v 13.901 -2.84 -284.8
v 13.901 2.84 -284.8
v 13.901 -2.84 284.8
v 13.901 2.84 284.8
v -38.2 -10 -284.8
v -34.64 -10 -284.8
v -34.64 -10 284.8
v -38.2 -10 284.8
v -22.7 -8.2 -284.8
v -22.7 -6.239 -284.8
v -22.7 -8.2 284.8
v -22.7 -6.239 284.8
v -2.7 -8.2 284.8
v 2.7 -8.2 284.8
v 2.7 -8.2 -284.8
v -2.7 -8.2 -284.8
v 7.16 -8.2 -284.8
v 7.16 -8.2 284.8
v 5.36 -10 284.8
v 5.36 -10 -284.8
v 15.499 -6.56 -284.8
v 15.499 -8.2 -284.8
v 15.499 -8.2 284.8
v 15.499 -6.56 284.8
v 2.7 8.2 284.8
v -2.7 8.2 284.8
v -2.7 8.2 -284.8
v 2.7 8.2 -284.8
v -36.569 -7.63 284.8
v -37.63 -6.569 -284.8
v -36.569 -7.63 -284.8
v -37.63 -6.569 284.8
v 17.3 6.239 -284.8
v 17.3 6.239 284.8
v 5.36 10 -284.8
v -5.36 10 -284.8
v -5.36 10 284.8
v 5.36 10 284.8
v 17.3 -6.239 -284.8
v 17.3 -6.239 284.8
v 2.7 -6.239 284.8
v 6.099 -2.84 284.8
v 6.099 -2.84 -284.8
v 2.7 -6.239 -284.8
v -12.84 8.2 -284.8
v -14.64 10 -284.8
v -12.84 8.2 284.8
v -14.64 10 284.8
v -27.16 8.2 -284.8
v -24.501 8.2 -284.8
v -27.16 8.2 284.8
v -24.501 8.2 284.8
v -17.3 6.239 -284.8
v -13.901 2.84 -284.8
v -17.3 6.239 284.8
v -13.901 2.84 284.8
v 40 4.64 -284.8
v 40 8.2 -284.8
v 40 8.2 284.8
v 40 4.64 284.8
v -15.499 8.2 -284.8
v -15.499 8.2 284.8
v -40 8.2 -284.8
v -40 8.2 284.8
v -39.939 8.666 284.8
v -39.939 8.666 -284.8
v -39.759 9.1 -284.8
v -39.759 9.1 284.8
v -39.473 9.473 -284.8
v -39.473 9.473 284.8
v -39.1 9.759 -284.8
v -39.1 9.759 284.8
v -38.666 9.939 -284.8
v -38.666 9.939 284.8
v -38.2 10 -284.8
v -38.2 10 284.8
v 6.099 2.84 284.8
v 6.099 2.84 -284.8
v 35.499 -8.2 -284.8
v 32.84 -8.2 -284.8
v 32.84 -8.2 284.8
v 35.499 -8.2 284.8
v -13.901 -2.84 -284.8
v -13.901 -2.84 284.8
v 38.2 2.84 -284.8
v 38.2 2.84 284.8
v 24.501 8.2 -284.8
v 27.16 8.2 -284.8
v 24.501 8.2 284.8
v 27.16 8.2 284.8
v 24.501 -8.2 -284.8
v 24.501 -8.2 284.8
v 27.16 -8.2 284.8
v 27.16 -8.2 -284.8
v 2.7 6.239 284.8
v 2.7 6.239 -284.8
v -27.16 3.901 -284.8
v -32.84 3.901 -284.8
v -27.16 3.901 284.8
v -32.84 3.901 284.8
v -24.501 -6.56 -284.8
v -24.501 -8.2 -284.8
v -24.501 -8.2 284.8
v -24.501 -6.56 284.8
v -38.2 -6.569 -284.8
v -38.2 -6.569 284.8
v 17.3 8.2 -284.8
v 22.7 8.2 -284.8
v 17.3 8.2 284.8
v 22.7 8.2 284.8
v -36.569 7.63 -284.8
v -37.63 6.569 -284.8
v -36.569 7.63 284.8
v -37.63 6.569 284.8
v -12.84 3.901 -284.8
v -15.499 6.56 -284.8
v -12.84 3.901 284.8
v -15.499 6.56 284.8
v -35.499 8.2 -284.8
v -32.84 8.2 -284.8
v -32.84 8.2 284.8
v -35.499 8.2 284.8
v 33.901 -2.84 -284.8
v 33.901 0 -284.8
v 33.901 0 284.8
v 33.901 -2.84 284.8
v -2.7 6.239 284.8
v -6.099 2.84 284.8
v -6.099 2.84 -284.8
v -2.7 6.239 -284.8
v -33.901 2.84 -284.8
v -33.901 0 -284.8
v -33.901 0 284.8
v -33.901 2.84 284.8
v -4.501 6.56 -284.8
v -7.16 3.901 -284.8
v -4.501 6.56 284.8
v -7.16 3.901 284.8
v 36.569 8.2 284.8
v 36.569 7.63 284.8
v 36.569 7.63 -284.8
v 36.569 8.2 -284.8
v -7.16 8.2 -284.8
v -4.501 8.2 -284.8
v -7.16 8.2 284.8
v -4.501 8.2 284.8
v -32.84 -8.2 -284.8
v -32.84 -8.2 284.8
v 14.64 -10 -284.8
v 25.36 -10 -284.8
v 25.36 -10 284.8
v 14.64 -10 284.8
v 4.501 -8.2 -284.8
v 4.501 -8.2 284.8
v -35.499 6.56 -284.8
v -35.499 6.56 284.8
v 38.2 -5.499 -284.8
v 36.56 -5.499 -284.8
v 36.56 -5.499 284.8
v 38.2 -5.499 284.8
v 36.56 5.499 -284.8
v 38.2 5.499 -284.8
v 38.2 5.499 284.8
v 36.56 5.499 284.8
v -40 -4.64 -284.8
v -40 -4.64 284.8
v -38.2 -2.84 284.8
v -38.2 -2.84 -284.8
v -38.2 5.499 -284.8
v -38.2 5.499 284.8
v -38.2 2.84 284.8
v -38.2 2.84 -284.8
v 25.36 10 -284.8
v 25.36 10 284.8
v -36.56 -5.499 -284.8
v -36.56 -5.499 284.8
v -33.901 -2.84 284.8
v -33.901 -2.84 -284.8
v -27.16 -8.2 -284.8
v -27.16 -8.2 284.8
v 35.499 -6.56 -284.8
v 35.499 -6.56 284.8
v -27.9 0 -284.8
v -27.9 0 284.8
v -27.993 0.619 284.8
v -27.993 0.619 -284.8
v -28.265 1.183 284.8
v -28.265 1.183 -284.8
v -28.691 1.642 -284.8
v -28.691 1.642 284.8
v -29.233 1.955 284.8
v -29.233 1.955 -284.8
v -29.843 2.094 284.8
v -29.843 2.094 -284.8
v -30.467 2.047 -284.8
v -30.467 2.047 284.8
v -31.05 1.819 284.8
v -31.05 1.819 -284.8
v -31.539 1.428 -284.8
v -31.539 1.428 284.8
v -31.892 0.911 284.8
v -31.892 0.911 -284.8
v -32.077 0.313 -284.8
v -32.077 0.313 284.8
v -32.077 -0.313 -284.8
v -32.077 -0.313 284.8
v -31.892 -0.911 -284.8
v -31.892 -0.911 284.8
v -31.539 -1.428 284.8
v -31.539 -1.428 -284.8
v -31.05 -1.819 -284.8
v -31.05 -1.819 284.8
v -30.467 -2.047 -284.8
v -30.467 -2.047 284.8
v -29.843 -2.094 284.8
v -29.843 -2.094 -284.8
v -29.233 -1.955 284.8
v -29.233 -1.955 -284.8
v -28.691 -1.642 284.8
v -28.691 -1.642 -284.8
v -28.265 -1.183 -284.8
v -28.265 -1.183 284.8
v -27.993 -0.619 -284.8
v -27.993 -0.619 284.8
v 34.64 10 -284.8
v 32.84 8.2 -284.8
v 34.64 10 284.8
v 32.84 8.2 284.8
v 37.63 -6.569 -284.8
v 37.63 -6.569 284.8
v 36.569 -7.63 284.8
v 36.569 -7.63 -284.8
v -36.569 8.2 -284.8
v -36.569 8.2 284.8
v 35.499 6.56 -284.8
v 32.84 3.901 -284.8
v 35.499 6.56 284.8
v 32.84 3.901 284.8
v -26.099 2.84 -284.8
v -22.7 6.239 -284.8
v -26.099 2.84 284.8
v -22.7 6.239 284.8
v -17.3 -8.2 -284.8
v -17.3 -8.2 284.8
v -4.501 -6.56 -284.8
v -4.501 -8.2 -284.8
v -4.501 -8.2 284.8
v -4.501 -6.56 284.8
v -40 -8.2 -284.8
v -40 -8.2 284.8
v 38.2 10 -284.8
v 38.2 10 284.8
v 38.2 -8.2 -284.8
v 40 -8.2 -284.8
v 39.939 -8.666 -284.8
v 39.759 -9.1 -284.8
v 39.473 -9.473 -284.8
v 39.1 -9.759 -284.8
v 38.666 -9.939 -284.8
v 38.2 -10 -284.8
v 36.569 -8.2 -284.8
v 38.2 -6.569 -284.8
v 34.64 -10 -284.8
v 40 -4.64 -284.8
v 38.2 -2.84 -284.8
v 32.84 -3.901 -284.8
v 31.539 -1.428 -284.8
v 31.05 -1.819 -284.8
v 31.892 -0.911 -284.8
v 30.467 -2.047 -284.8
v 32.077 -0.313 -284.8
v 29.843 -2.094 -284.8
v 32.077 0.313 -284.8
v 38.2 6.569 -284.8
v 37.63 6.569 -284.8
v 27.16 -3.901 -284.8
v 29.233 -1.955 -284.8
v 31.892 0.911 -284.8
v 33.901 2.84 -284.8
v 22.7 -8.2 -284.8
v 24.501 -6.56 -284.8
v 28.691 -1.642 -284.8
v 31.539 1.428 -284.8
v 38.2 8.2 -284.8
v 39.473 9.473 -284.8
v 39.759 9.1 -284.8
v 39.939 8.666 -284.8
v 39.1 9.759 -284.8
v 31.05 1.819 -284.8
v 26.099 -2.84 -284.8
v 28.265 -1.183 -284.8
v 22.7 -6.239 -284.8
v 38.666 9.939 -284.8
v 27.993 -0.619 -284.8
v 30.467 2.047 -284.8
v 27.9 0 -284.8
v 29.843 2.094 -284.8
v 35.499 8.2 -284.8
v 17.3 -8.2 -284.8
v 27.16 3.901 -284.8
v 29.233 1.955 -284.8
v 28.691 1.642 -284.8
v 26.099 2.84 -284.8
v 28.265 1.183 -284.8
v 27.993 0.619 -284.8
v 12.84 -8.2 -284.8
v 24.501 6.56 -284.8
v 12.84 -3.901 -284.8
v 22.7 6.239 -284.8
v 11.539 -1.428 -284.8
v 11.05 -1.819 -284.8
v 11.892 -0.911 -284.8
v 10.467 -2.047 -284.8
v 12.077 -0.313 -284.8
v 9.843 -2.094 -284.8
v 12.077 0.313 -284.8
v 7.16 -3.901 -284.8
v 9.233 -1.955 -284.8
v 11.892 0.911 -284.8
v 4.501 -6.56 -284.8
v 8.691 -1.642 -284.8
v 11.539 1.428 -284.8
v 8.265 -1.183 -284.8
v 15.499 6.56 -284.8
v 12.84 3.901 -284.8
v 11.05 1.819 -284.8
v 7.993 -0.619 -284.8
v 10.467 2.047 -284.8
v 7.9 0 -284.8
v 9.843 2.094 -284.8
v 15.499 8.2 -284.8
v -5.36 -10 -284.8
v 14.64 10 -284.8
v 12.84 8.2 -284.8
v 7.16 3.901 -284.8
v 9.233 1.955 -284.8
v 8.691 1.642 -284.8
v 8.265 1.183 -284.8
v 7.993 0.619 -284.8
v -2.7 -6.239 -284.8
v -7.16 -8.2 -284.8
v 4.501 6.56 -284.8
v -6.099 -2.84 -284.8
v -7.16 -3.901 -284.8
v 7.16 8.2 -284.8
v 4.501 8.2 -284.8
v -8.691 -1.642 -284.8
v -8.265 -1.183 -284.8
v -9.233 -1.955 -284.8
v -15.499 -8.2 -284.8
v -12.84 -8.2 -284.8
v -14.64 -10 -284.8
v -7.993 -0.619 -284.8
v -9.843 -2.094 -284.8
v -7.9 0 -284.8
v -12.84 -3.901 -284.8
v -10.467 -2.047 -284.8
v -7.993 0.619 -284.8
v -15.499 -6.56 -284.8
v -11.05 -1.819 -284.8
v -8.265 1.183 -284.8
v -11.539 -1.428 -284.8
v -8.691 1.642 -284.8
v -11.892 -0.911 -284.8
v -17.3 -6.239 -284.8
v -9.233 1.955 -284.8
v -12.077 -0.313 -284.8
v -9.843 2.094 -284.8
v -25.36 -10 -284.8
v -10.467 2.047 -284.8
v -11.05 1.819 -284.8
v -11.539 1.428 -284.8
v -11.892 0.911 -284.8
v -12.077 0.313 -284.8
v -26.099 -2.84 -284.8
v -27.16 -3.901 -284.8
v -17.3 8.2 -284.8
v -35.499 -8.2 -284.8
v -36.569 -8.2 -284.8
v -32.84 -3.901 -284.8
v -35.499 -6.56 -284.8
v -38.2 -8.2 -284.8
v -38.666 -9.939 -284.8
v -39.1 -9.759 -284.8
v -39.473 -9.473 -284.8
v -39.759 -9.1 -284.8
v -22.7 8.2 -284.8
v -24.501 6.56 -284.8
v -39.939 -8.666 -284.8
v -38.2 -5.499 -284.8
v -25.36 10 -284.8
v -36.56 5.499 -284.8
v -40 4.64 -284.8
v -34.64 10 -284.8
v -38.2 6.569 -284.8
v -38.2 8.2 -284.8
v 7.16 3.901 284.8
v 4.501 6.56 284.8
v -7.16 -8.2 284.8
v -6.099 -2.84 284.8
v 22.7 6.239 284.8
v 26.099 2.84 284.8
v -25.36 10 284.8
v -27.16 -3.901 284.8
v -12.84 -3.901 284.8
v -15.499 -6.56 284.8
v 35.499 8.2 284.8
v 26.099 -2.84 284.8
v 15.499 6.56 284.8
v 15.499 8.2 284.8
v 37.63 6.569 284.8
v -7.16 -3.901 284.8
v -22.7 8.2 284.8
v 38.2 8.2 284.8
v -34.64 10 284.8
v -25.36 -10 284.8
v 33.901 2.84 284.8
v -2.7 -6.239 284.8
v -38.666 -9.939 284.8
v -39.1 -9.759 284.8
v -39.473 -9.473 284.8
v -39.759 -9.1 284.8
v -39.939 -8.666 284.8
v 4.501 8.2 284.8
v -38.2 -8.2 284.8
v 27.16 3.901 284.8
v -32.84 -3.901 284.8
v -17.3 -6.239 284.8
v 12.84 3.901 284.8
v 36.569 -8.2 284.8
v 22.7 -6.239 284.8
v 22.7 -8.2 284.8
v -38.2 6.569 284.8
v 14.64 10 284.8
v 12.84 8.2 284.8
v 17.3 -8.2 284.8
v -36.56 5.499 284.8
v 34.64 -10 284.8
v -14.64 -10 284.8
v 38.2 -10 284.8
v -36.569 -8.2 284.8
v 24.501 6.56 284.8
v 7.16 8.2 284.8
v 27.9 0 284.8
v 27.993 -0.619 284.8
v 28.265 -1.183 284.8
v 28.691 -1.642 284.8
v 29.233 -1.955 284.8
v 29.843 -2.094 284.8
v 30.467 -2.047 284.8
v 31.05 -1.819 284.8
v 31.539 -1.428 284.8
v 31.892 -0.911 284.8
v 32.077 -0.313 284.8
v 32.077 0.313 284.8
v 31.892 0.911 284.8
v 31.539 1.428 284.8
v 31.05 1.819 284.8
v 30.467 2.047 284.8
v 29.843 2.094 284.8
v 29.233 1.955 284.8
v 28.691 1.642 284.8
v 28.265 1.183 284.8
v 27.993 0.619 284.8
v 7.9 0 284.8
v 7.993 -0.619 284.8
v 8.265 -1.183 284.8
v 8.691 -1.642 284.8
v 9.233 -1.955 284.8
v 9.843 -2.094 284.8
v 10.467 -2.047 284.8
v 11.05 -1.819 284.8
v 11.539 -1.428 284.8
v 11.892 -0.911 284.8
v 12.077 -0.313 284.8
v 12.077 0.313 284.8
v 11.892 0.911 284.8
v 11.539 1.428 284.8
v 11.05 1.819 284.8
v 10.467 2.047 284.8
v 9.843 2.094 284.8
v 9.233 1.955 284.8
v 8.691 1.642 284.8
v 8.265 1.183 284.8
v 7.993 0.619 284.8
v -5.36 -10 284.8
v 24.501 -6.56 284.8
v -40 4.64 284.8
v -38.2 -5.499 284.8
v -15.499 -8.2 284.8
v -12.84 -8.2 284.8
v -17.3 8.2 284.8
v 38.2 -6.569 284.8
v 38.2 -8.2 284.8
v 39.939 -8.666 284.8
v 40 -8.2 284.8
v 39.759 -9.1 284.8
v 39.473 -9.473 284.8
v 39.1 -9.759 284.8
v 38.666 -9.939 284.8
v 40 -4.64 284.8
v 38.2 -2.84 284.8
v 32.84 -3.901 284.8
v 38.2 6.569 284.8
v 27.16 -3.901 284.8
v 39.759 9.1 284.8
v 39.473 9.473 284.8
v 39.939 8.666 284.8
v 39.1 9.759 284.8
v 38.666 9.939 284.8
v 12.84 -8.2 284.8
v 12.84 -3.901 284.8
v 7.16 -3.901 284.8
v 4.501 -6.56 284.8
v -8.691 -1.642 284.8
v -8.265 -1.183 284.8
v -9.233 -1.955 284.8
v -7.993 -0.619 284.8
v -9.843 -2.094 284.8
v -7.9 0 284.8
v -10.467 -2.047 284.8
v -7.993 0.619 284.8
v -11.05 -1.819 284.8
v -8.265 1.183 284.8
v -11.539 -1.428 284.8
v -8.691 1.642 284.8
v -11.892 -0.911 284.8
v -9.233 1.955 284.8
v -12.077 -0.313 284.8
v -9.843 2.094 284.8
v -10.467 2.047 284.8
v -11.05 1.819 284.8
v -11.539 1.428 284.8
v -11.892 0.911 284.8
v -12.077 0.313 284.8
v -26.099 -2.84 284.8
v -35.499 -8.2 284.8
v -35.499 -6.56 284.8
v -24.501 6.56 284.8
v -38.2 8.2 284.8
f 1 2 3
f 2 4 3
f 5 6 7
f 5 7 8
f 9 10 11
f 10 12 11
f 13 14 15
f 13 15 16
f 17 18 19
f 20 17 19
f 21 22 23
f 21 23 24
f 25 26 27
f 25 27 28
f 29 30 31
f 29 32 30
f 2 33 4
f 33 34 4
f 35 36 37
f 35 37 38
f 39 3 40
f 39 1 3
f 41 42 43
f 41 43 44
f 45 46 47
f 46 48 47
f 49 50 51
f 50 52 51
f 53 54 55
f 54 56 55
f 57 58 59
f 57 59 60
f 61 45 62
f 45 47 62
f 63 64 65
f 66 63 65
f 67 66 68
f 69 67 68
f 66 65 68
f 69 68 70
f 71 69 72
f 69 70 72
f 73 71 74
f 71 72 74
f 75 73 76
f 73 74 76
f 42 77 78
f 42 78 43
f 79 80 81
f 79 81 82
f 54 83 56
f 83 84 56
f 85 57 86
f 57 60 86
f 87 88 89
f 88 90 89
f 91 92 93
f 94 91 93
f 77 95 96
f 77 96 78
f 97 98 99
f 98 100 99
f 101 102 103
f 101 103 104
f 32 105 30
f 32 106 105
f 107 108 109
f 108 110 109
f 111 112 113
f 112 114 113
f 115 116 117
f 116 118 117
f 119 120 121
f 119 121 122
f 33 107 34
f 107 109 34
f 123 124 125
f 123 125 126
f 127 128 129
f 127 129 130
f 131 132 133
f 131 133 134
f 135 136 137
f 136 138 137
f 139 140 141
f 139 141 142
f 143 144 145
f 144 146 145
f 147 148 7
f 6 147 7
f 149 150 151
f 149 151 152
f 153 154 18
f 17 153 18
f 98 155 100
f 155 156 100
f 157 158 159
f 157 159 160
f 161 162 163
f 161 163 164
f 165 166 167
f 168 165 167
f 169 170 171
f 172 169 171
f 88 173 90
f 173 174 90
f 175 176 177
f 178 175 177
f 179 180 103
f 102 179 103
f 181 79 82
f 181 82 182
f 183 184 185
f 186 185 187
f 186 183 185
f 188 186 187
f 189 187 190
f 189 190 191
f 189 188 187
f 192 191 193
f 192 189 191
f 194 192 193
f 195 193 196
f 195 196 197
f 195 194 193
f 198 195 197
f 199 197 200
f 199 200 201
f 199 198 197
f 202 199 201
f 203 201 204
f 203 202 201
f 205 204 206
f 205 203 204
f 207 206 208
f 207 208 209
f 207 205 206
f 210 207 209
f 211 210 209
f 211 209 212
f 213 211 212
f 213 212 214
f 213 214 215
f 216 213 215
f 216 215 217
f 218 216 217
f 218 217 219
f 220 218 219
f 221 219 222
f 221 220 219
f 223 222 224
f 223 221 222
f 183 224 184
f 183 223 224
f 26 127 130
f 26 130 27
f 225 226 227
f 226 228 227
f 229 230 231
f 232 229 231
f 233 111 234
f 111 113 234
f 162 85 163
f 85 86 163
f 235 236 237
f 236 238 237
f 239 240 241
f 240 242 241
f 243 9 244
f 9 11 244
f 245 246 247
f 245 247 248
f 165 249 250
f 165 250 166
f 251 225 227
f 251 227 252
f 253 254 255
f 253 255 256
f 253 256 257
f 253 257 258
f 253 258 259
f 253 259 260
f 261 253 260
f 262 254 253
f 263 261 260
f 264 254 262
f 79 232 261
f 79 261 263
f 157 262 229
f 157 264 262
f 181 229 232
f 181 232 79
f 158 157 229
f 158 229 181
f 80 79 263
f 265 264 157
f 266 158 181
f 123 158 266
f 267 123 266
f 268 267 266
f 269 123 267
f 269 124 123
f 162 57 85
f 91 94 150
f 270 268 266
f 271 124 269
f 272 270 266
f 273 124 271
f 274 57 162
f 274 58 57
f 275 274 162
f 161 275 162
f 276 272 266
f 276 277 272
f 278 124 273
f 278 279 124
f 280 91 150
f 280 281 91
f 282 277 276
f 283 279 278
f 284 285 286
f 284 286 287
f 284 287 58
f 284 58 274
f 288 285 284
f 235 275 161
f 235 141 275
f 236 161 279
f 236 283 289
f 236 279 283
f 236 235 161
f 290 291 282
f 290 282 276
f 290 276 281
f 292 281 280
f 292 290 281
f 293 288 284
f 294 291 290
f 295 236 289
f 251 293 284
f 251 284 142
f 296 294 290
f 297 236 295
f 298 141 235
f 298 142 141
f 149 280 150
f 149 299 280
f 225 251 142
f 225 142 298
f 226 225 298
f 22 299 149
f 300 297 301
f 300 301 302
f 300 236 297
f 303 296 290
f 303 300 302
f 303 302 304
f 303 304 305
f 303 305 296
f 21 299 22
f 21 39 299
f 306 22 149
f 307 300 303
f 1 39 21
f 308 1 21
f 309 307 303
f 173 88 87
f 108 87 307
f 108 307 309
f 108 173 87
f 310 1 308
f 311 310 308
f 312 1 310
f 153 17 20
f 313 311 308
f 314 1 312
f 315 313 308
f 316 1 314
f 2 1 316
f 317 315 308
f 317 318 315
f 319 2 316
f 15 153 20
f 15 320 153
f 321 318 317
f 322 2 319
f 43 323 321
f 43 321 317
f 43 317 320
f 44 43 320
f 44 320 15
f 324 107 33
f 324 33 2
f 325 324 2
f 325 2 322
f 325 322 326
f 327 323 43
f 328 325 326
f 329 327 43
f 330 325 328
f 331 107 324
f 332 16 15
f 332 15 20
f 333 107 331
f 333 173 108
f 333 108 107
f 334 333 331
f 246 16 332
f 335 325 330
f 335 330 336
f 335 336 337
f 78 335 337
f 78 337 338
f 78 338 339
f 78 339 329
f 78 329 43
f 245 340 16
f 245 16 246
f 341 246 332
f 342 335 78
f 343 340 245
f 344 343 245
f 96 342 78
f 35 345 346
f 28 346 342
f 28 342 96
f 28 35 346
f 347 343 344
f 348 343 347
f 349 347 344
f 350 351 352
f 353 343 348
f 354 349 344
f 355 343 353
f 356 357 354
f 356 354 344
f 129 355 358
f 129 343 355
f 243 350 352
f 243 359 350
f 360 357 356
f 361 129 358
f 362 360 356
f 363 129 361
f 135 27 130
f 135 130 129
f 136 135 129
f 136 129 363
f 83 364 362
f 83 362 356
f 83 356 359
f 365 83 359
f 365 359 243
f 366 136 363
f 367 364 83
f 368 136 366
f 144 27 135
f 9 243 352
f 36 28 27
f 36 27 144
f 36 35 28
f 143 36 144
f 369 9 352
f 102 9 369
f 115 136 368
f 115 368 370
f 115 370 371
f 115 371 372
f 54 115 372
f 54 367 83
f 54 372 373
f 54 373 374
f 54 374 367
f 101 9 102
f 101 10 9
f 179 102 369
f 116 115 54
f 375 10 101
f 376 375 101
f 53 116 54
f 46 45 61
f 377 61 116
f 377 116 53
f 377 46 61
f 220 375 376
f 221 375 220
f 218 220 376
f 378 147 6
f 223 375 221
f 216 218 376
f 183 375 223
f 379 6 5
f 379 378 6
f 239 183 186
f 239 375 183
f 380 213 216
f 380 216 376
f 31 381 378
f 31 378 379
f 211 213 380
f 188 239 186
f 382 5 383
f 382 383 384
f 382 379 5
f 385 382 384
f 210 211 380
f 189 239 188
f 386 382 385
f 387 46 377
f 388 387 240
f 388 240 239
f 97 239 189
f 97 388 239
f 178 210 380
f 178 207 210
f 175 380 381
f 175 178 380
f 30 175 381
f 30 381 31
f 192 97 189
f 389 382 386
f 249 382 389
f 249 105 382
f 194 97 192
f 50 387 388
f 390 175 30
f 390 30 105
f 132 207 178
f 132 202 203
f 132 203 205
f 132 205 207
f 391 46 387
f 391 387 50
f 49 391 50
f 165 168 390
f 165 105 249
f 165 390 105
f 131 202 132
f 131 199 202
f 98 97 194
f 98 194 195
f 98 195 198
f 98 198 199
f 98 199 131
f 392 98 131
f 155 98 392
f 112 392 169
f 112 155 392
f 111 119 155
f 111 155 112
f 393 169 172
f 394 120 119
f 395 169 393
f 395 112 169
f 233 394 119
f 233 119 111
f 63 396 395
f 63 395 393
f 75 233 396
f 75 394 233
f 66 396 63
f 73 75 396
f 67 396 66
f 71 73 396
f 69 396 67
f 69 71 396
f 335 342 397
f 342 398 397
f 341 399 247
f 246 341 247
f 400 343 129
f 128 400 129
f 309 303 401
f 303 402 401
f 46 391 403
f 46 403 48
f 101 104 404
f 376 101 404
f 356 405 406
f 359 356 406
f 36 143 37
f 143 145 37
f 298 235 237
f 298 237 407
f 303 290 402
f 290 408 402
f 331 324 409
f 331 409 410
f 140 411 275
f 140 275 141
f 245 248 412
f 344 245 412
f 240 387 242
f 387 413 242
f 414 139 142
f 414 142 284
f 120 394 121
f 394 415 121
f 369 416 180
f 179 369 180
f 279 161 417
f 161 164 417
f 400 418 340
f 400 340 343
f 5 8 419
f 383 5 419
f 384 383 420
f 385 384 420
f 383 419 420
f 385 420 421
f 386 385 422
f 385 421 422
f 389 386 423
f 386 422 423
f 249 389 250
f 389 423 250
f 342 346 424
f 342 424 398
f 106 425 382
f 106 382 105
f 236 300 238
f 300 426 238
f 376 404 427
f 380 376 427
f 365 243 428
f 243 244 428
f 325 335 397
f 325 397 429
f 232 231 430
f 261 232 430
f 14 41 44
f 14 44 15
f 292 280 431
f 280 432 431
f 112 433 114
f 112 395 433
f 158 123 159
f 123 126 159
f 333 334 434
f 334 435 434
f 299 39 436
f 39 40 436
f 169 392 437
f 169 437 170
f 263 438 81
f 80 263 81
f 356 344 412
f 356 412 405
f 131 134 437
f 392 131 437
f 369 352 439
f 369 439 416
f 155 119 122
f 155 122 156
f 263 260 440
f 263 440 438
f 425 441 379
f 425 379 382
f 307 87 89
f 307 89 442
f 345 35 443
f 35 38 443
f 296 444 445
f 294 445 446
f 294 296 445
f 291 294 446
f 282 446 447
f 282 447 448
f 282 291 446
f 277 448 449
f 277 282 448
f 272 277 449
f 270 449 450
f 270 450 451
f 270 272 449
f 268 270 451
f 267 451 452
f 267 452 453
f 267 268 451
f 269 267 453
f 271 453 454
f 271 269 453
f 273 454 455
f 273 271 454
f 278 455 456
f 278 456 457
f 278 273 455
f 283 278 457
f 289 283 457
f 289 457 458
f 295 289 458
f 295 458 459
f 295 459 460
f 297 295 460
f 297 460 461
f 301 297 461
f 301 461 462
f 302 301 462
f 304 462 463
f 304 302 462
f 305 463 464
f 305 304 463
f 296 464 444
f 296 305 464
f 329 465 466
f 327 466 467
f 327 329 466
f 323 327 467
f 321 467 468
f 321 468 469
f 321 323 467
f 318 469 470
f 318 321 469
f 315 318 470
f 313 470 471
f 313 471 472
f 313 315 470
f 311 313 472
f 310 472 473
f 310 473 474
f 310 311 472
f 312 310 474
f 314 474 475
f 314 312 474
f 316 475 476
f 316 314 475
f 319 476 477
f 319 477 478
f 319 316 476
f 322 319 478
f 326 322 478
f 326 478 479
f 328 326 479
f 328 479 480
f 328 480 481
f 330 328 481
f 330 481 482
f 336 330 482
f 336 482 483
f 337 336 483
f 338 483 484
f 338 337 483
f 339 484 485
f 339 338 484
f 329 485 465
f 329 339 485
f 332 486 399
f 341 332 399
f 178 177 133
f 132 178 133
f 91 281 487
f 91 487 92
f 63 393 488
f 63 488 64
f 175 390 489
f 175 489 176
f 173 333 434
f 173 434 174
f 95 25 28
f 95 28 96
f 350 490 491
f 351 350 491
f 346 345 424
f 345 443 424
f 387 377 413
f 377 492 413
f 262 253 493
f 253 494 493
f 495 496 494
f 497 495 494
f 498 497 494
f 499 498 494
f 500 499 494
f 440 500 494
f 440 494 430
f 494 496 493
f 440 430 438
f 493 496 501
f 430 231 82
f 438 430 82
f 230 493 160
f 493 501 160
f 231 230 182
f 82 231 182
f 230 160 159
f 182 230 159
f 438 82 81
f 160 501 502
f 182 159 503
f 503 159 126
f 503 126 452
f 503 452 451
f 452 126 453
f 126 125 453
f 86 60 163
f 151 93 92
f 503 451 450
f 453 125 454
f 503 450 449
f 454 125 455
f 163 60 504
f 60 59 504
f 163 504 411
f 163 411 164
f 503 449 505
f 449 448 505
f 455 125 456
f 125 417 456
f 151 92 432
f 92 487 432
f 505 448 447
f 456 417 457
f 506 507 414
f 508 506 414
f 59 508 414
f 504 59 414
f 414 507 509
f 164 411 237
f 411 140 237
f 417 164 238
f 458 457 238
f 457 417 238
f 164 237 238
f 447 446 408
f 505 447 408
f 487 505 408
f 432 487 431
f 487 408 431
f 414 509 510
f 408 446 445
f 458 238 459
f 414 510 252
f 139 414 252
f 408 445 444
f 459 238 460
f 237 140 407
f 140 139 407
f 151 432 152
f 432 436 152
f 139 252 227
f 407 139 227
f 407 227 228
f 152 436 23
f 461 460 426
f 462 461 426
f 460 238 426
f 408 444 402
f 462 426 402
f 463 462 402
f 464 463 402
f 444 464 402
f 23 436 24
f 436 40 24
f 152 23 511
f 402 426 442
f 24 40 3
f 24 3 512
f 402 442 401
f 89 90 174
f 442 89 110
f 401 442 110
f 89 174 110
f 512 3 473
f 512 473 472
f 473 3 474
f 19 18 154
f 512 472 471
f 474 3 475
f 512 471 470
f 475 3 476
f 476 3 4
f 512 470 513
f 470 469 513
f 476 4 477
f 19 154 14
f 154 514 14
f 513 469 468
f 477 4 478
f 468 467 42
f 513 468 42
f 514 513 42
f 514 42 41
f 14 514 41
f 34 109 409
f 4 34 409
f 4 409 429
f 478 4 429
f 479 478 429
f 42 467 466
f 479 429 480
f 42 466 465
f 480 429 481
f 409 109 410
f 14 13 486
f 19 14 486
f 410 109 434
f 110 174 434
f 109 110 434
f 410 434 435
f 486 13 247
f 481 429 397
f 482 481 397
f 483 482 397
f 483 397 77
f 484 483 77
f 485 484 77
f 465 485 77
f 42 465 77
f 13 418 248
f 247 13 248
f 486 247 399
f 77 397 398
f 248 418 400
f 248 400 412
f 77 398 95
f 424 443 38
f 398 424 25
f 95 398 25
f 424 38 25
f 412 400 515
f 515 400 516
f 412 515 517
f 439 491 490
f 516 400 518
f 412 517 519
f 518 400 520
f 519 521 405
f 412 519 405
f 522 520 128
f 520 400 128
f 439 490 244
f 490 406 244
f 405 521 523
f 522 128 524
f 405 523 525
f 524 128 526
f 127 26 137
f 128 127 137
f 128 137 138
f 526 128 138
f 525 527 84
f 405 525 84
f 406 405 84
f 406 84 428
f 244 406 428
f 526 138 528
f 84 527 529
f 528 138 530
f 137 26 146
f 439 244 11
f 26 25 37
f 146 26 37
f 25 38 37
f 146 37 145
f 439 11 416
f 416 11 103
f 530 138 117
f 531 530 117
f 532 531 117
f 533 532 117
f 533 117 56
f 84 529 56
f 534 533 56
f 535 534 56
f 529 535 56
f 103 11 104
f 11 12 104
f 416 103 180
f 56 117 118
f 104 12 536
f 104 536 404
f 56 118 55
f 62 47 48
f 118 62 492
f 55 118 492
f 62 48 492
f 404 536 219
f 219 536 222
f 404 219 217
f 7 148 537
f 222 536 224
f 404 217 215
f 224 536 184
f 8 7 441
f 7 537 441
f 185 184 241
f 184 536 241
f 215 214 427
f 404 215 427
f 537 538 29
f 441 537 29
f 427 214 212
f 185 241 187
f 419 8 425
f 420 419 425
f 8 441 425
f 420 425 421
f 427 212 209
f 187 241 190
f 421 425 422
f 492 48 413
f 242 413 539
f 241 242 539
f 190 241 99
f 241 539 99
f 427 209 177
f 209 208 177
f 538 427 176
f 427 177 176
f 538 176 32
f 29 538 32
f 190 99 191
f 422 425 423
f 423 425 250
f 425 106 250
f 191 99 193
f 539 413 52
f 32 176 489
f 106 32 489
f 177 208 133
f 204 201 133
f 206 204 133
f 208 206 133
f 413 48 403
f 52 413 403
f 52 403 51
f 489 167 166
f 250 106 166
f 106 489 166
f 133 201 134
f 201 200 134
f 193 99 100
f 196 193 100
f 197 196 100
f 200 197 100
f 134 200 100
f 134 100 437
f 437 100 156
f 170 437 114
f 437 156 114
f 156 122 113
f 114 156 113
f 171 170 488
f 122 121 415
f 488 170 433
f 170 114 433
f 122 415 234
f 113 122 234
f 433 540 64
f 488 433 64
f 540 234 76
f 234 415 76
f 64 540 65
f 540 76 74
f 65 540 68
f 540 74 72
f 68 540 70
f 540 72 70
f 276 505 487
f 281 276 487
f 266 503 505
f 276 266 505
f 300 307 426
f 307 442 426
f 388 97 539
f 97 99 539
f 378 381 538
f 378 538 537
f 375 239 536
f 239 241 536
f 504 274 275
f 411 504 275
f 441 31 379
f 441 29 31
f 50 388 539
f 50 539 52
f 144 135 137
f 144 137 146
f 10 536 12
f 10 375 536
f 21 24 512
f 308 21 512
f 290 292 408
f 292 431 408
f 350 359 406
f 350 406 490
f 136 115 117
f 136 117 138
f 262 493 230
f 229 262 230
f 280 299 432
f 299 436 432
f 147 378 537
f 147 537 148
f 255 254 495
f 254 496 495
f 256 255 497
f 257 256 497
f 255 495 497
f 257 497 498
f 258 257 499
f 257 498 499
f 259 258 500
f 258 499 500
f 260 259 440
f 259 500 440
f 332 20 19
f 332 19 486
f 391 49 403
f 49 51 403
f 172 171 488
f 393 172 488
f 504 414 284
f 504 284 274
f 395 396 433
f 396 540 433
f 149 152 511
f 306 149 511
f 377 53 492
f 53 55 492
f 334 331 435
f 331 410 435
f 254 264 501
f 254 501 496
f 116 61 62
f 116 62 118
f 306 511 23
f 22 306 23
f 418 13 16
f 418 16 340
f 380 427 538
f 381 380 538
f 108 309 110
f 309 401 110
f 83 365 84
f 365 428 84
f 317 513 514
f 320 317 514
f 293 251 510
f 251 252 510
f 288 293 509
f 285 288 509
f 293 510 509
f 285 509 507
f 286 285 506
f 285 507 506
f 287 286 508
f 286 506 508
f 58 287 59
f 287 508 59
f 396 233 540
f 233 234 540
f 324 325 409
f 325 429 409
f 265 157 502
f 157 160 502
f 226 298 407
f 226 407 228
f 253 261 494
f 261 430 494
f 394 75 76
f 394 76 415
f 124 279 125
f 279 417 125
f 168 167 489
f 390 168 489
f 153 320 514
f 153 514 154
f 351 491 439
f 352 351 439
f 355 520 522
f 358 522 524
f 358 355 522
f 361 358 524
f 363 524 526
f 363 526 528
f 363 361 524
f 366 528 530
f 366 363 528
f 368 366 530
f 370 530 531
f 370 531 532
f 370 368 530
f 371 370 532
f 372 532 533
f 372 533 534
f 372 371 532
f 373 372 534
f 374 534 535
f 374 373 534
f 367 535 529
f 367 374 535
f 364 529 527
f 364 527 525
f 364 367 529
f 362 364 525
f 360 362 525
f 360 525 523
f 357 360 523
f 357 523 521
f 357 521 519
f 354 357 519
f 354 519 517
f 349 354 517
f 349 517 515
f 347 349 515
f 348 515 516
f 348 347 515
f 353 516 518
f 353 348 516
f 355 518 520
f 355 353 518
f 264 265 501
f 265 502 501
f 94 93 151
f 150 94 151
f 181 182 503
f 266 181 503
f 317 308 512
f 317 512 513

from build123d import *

# Parameters (mm, degrees)
SKETCH1_R      = 2.1
EXTRUDE1_DEPTH = 284.8


with BuildPart() as part:
    # Sketch1 → Extrude1 (new, symmetric)
    with BuildSketch(Plane.XY):
        with BuildLine():
            Line((-38.199999929, 10), (-34.639999675, 10))
            Line((-34.639999675, 10), (-32.839999603, 8.2))
            Line((-32.839999603, 8.2), (-35.499339671, 8.2))
            Line((-35.499339671, 8.2), (-35.499339671, 6.56))
            Line((-35.499339671, 6.56), (-32.839999603, 3.900660038))
            Line((-32.839999603, 3.900660038), (-27.159999603, 3.900660038))
            Line((-27.159999603, 3.900660038), (-24.500659536, 6.56))
            Line((-24.500659536, 6.56), (-24.500659536, 8.2))
            Line((-24.500659536, 8.2), (-27.159999603, 8.2))
            Line((-27.159999603, 8.2), (-25.359999532, 10))
            Line((-25.359999532, 10), (-14.640000468, 10))
            Line((-14.640000468, 10), (-12.840000397, 8.2))
            Line((-12.840000397, 8.2), (-15.499340464, 8.2))
            Line((-15.499340464, 8.2), (-15.499340464, 6.56))
            Line((-15.499340464, 6.56), (-12.840000397, 3.900660038))
            Line((-12.840000397, 3.900660038), (-7.159998809, 3.900660038))
            Line((-7.159998809, 3.900660038), (-4.500658742, 6.56))
            Line((-4.500658742, 6.56), (-4.500658742, 8.2))
            Line((-4.500658742, 8.2), (-7.159998809, 8.2))
            Line((-7.159998809, 8.2), (-5.359998738, 10))
            Line((-5.359998738, 10), (5.359998738, 10))
            Line((5.359998738, 10), (7.159998809, 8.2))
            Line((7.159998809, 8.2), (4.500658742, 8.2))
            Line((4.500658742, 8.2), (4.500658742, 6.56))
            Line((4.500658742, 6.56), (7.159998809, 3.900660038))
            Line((7.159998809, 3.900660038), (12.840000397, 3.900660038))
            Line((12.840000397, 3.900660038), (15.499340464, 6.56))
            Line((15.499340464, 6.56), (15.499340464, 8.2))
            Line((15.499340464, 8.2), (12.840000397, 8.2))
            Line((12.840000397, 8.2), (14.640000468, 10))
            Line((14.640000468, 10), (25.359999532, 10))
            Line((25.359999532, 10), (27.159999603, 8.2))
            Line((27.159999603, 8.2), (24.500659536, 8.2))
            Line((24.500659536, 8.2), (24.500659536, 6.56))
            Line((24.500659536, 6.56), (27.159999603, 3.900660038))
            Line((27.159999603, 3.900660038), (32.839999603, 3.900660038))
            Line((32.839999603, 3.900660038), (35.499339671, 6.56))
            Line((35.499339671, 6.56), (35.499339671, 8.2))
            Line((35.499339671, 8.2), (32.839999603, 8.2))
            Line((32.839999603, 8.2), (34.639999675, 10))
            Line((34.639999675, 10), (38.199999929, 10))
            ThreePointArc((38.199999929, 10), (39.47279216, 9.472792181), (39.999999929, 8.199999929))
            Line((39.999999929, 8.199999929), (39.999999787, 4.639999675))
            Line((39.999999787, 4.639999675), (38.199999716, 2.839999675))
            Line((38.199999716, 2.839999675), (38.199999821, 5.499339742))
            Line((38.199999821, 5.499339742), (36.559999821, 5.499339807))
            Line((36.559999821, 5.499339807), (33.900659754, 2.839999845))
            Line((33.900659754, 2.839999845), (33.900659641, 0))
            Line((33.900659641, 0), (33.900659754, -2.839999845))
            Line((33.900659754, -2.839999845), (36.559999821, -5.499339807))
            Line((36.559999821, -5.499339807), (38.199999821, -5.499339742))
            Line((38.199999821, -5.499339742), (38.199999716, -2.839999675))
            Line((38.199999716, -2.839999675), (39.999999787, -4.639999675))
            Line((39.999999787, -4.639999675), (39.999999929, -8.199999929))
            ThreePointArc((39.999999929, -8.199999929), (39.47279216, -9.472792181), (38.199999929, -10))
            Line((38.199999929, -10), (34.639999675, -10))
            Line((34.639999675, -10), (32.839999603, -8.2))
            Line((32.839999603, -8.2), (35.499339671, -8.2))
            Line((35.499339671, -8.2), (35.499339671, -6.56))
            Line((35.499339671, -6.56), (32.839999603, -3.900660038))
            Line((32.839999603, -3.900660038), (27.159999603, -3.900660038))
            Line((27.159999603, -3.900660038), (24.500659536, -6.56))
            Line((24.500659536, -6.56), (24.500659536, -8.2))
            Line((24.500659536, -8.2), (27.159999603, -8.2))
            Line((27.159999603, -8.2), (25.359999532, -10))
            Line((25.359999532, -10), (14.640000468, -10))
            Line((14.640000468, -10), (12.840000397, -8.2))
            Line((12.840000397, -8.2), (15.499340464, -8.2))
            Line((15.499340464, -8.2), (15.499340464, -6.56))
            Line((15.499340464, -6.56), (12.840000397, -3.900660038))
            Line((12.840000397, -3.900660038), (7.159998809, -3.900660038))
            Line((7.159998809, -3.900660038), (4.500658742, -6.56))
            Line((4.500658742, -6.56), (4.500658742, -8.2))
            Line((4.500658742, -8.2), (7.159998809, -8.2))
            Line((7.159998809, -8.2), (5.359998738, -10))
            Line((5.359998738, -10), (-5.359998738, -10))
            Line((-5.359998738, -10), (-7.159998809, -8.2))
            Line((-7.159998809, -8.2), (-4.500658742, -8.2))
            Line((-4.500658742, -8.2), (-4.500658742, -6.56))
            Line((-4.500658742, -6.56), (-7.159998809, -3.900660038))
            Line((-7.159998809, -3.900660038), (-12.840000397, -3.900660038))
            Line((-12.840000397, -3.900660038), (-15.499340464, -6.56))
            Line((-15.499340464, -6.56), (-15.499340464, -8.2))
            Line((-15.499340464, -8.2), (-12.840000397, -8.2))
            Line((-12.840000397, -8.2), (-14.640000468, -10))
            Line((-14.640000468, -10), (-25.359999532, -10))
            Line((-25.359999532, -10), (-27.159999603, -8.2))
            Line((-27.159999603, -8.2), (-24.500659536, -8.2))
            Line((-24.500659536, -8.2), (-24.500659536, -6.56))
            Line((-24.500659536, -6.56), (-27.159999603, -3.900660038))
            Line((-27.159999603, -3.900660038), (-32.839999603, -3.900660038))
            Line((-32.839999603, -3.900660038), (-35.499339671, -6.56))
            Line((-35.499339671, -6.56), (-35.499339671, -8.2))
            Line((-35.499339671, -8.2), (-32.839999603, -8.2))
            Line((-32.839999603, -8.2), (-34.639999675, -10))
            Line((-34.639999675, -10), (-38.199999929, -10))
            ThreePointArc((-38.199999929, -10), (-39.47279216, -9.472792181), (-39.999999929, -8.199999929))
            Line((-39.999999929, -8.199999929), (-39.999999787, -4.639999675))
            Line((-39.999999787, -4.639999675), (-38.199999716, -2.839999675))
            Line((-38.199999716, -2.839999675), (-38.199999821, -5.499339742))
            Line((-38.199999821, -5.499339742), (-36.559999821, -5.499339807))
            Line((-36.559999821, -5.499339807), (-33.900659754, -2.839999845))
            Line((-33.900659754, -2.839999845), (-33.900659641, 0))
            Line((-33.900659641, 0), (-33.900659754, 2.839999845))
            Line((-33.900659754, 2.839999845), (-36.559999821, 5.499339807))
            Line((-36.559999821, 5.499339807), (-38.199999821, 5.499339742))
            Line((-38.199999821, 5.499339742), (-38.199999716, 2.839999675))
            Line((-38.199999716, 2.839999675), (-39.999999787, 4.639999675))
            Line((-39.999999787, 4.639999675), (-39.999999929, 8.199999929))
            ThreePointArc((-39.999999929, 8.199999929), (-39.47279216, 9.472792181), (-38.199999929, 10))
        make_face()
        with Locations((-29.999999603, 0)):
            Circle(SKETCH1_R, mode=Mode.SUBTRACT)
        with Locations((-9.999999603, 0)):
            Circle(SKETCH1_R, mode=Mode.SUBTRACT)
        with Locations(Location((29.999999603, 0, 0), (0, 0, 180))):
            Circle(SKETCH1_R, mode=Mode.SUBTRACT)
        with Locations(Location((9.999999603, 0, 0), (0, 0, 180))):
            Circle(SKETCH1_R, mode=Mode.SUBTRACT)
        Polygon((-38.199999929, 8.2), (-38.199999864, 6.569339742), (-37.629999799, 6.569339742), (-36.569339648, 7.629999935), (-36.569339648, 8.2), align=None, mode=Mode.SUBTRACT)
        Polygon((-17.3, 6.239339079), (-17.3, 8.2), (-22.7, 8.2), (-22.7, 6.239339079), (-26.099339368, 2.839999845), (-26.099339368, -2.839999845), (-22.7, -6.239339079), (-22.7, -8.2), (-17.3, -8.2), (-17.3, -6.239339079), (-13.900660632, -2.839999845), (-13.900660632, 2.839999845), align=None, mode=Mode.SUBTRACT)
        Polygon((-6.099339678, -2.840000949), (-6.099339678, 2.840000949), (-2.700001413, 6.239339079), (-2.700001413, 8.2), (2.700001413, 8.2), (2.700001413, 6.239339079), (6.099339678, 2.840000949), (6.099339678, -2.840000949), (2.700001413, -6.239339079), (2.700001413, -8.2), (-2.700001413, -8.2), (-2.700001413, -6.239339079), align=None, mode=Mode.SUBTRACT)
        Polygon((-36.569339648, -7.629999935), (-36.569339648, -8.2), (-38.199999929, -8.2), (-38.199999864, -6.569339742), (-37.629999799, -6.569339742), align=None, mode=Mode.SUBTRACT)
        Polygon((36.569339648, 8.2), (38.199999929, 8.2), (38.199999864, 6.569339742), (37.629999799, 6.569339742), (36.569339648, 7.629999935), align=None, mode=Mode.SUBTRACT)
        Polygon((36.569339648, -8.2), (38.199999929, -8.2), (38.199999864, -6.569339742), (37.629999799, -6.569339742), (36.569339648, -7.629999935), align=None, mode=Mode.SUBTRACT)
        Polygon((13.900660632, -2.839999845), (17.3, -6.239339079), (17.3, -8.2), (22.7, -8.2), (22.7, -6.239339079), (26.099339368, -2.839999845), (26.099339368, 2.839999845), (22.7, 6.239339079), (22.7, 8.2), (17.3, 8.2), (17.3, 6.239339079), (13.900660632, 2.839999845), align=None, mode=Mode.SUBTRACT)
    extrude(amount=EXTRUDE1_DEPTH, both=True)


solid = part.part
